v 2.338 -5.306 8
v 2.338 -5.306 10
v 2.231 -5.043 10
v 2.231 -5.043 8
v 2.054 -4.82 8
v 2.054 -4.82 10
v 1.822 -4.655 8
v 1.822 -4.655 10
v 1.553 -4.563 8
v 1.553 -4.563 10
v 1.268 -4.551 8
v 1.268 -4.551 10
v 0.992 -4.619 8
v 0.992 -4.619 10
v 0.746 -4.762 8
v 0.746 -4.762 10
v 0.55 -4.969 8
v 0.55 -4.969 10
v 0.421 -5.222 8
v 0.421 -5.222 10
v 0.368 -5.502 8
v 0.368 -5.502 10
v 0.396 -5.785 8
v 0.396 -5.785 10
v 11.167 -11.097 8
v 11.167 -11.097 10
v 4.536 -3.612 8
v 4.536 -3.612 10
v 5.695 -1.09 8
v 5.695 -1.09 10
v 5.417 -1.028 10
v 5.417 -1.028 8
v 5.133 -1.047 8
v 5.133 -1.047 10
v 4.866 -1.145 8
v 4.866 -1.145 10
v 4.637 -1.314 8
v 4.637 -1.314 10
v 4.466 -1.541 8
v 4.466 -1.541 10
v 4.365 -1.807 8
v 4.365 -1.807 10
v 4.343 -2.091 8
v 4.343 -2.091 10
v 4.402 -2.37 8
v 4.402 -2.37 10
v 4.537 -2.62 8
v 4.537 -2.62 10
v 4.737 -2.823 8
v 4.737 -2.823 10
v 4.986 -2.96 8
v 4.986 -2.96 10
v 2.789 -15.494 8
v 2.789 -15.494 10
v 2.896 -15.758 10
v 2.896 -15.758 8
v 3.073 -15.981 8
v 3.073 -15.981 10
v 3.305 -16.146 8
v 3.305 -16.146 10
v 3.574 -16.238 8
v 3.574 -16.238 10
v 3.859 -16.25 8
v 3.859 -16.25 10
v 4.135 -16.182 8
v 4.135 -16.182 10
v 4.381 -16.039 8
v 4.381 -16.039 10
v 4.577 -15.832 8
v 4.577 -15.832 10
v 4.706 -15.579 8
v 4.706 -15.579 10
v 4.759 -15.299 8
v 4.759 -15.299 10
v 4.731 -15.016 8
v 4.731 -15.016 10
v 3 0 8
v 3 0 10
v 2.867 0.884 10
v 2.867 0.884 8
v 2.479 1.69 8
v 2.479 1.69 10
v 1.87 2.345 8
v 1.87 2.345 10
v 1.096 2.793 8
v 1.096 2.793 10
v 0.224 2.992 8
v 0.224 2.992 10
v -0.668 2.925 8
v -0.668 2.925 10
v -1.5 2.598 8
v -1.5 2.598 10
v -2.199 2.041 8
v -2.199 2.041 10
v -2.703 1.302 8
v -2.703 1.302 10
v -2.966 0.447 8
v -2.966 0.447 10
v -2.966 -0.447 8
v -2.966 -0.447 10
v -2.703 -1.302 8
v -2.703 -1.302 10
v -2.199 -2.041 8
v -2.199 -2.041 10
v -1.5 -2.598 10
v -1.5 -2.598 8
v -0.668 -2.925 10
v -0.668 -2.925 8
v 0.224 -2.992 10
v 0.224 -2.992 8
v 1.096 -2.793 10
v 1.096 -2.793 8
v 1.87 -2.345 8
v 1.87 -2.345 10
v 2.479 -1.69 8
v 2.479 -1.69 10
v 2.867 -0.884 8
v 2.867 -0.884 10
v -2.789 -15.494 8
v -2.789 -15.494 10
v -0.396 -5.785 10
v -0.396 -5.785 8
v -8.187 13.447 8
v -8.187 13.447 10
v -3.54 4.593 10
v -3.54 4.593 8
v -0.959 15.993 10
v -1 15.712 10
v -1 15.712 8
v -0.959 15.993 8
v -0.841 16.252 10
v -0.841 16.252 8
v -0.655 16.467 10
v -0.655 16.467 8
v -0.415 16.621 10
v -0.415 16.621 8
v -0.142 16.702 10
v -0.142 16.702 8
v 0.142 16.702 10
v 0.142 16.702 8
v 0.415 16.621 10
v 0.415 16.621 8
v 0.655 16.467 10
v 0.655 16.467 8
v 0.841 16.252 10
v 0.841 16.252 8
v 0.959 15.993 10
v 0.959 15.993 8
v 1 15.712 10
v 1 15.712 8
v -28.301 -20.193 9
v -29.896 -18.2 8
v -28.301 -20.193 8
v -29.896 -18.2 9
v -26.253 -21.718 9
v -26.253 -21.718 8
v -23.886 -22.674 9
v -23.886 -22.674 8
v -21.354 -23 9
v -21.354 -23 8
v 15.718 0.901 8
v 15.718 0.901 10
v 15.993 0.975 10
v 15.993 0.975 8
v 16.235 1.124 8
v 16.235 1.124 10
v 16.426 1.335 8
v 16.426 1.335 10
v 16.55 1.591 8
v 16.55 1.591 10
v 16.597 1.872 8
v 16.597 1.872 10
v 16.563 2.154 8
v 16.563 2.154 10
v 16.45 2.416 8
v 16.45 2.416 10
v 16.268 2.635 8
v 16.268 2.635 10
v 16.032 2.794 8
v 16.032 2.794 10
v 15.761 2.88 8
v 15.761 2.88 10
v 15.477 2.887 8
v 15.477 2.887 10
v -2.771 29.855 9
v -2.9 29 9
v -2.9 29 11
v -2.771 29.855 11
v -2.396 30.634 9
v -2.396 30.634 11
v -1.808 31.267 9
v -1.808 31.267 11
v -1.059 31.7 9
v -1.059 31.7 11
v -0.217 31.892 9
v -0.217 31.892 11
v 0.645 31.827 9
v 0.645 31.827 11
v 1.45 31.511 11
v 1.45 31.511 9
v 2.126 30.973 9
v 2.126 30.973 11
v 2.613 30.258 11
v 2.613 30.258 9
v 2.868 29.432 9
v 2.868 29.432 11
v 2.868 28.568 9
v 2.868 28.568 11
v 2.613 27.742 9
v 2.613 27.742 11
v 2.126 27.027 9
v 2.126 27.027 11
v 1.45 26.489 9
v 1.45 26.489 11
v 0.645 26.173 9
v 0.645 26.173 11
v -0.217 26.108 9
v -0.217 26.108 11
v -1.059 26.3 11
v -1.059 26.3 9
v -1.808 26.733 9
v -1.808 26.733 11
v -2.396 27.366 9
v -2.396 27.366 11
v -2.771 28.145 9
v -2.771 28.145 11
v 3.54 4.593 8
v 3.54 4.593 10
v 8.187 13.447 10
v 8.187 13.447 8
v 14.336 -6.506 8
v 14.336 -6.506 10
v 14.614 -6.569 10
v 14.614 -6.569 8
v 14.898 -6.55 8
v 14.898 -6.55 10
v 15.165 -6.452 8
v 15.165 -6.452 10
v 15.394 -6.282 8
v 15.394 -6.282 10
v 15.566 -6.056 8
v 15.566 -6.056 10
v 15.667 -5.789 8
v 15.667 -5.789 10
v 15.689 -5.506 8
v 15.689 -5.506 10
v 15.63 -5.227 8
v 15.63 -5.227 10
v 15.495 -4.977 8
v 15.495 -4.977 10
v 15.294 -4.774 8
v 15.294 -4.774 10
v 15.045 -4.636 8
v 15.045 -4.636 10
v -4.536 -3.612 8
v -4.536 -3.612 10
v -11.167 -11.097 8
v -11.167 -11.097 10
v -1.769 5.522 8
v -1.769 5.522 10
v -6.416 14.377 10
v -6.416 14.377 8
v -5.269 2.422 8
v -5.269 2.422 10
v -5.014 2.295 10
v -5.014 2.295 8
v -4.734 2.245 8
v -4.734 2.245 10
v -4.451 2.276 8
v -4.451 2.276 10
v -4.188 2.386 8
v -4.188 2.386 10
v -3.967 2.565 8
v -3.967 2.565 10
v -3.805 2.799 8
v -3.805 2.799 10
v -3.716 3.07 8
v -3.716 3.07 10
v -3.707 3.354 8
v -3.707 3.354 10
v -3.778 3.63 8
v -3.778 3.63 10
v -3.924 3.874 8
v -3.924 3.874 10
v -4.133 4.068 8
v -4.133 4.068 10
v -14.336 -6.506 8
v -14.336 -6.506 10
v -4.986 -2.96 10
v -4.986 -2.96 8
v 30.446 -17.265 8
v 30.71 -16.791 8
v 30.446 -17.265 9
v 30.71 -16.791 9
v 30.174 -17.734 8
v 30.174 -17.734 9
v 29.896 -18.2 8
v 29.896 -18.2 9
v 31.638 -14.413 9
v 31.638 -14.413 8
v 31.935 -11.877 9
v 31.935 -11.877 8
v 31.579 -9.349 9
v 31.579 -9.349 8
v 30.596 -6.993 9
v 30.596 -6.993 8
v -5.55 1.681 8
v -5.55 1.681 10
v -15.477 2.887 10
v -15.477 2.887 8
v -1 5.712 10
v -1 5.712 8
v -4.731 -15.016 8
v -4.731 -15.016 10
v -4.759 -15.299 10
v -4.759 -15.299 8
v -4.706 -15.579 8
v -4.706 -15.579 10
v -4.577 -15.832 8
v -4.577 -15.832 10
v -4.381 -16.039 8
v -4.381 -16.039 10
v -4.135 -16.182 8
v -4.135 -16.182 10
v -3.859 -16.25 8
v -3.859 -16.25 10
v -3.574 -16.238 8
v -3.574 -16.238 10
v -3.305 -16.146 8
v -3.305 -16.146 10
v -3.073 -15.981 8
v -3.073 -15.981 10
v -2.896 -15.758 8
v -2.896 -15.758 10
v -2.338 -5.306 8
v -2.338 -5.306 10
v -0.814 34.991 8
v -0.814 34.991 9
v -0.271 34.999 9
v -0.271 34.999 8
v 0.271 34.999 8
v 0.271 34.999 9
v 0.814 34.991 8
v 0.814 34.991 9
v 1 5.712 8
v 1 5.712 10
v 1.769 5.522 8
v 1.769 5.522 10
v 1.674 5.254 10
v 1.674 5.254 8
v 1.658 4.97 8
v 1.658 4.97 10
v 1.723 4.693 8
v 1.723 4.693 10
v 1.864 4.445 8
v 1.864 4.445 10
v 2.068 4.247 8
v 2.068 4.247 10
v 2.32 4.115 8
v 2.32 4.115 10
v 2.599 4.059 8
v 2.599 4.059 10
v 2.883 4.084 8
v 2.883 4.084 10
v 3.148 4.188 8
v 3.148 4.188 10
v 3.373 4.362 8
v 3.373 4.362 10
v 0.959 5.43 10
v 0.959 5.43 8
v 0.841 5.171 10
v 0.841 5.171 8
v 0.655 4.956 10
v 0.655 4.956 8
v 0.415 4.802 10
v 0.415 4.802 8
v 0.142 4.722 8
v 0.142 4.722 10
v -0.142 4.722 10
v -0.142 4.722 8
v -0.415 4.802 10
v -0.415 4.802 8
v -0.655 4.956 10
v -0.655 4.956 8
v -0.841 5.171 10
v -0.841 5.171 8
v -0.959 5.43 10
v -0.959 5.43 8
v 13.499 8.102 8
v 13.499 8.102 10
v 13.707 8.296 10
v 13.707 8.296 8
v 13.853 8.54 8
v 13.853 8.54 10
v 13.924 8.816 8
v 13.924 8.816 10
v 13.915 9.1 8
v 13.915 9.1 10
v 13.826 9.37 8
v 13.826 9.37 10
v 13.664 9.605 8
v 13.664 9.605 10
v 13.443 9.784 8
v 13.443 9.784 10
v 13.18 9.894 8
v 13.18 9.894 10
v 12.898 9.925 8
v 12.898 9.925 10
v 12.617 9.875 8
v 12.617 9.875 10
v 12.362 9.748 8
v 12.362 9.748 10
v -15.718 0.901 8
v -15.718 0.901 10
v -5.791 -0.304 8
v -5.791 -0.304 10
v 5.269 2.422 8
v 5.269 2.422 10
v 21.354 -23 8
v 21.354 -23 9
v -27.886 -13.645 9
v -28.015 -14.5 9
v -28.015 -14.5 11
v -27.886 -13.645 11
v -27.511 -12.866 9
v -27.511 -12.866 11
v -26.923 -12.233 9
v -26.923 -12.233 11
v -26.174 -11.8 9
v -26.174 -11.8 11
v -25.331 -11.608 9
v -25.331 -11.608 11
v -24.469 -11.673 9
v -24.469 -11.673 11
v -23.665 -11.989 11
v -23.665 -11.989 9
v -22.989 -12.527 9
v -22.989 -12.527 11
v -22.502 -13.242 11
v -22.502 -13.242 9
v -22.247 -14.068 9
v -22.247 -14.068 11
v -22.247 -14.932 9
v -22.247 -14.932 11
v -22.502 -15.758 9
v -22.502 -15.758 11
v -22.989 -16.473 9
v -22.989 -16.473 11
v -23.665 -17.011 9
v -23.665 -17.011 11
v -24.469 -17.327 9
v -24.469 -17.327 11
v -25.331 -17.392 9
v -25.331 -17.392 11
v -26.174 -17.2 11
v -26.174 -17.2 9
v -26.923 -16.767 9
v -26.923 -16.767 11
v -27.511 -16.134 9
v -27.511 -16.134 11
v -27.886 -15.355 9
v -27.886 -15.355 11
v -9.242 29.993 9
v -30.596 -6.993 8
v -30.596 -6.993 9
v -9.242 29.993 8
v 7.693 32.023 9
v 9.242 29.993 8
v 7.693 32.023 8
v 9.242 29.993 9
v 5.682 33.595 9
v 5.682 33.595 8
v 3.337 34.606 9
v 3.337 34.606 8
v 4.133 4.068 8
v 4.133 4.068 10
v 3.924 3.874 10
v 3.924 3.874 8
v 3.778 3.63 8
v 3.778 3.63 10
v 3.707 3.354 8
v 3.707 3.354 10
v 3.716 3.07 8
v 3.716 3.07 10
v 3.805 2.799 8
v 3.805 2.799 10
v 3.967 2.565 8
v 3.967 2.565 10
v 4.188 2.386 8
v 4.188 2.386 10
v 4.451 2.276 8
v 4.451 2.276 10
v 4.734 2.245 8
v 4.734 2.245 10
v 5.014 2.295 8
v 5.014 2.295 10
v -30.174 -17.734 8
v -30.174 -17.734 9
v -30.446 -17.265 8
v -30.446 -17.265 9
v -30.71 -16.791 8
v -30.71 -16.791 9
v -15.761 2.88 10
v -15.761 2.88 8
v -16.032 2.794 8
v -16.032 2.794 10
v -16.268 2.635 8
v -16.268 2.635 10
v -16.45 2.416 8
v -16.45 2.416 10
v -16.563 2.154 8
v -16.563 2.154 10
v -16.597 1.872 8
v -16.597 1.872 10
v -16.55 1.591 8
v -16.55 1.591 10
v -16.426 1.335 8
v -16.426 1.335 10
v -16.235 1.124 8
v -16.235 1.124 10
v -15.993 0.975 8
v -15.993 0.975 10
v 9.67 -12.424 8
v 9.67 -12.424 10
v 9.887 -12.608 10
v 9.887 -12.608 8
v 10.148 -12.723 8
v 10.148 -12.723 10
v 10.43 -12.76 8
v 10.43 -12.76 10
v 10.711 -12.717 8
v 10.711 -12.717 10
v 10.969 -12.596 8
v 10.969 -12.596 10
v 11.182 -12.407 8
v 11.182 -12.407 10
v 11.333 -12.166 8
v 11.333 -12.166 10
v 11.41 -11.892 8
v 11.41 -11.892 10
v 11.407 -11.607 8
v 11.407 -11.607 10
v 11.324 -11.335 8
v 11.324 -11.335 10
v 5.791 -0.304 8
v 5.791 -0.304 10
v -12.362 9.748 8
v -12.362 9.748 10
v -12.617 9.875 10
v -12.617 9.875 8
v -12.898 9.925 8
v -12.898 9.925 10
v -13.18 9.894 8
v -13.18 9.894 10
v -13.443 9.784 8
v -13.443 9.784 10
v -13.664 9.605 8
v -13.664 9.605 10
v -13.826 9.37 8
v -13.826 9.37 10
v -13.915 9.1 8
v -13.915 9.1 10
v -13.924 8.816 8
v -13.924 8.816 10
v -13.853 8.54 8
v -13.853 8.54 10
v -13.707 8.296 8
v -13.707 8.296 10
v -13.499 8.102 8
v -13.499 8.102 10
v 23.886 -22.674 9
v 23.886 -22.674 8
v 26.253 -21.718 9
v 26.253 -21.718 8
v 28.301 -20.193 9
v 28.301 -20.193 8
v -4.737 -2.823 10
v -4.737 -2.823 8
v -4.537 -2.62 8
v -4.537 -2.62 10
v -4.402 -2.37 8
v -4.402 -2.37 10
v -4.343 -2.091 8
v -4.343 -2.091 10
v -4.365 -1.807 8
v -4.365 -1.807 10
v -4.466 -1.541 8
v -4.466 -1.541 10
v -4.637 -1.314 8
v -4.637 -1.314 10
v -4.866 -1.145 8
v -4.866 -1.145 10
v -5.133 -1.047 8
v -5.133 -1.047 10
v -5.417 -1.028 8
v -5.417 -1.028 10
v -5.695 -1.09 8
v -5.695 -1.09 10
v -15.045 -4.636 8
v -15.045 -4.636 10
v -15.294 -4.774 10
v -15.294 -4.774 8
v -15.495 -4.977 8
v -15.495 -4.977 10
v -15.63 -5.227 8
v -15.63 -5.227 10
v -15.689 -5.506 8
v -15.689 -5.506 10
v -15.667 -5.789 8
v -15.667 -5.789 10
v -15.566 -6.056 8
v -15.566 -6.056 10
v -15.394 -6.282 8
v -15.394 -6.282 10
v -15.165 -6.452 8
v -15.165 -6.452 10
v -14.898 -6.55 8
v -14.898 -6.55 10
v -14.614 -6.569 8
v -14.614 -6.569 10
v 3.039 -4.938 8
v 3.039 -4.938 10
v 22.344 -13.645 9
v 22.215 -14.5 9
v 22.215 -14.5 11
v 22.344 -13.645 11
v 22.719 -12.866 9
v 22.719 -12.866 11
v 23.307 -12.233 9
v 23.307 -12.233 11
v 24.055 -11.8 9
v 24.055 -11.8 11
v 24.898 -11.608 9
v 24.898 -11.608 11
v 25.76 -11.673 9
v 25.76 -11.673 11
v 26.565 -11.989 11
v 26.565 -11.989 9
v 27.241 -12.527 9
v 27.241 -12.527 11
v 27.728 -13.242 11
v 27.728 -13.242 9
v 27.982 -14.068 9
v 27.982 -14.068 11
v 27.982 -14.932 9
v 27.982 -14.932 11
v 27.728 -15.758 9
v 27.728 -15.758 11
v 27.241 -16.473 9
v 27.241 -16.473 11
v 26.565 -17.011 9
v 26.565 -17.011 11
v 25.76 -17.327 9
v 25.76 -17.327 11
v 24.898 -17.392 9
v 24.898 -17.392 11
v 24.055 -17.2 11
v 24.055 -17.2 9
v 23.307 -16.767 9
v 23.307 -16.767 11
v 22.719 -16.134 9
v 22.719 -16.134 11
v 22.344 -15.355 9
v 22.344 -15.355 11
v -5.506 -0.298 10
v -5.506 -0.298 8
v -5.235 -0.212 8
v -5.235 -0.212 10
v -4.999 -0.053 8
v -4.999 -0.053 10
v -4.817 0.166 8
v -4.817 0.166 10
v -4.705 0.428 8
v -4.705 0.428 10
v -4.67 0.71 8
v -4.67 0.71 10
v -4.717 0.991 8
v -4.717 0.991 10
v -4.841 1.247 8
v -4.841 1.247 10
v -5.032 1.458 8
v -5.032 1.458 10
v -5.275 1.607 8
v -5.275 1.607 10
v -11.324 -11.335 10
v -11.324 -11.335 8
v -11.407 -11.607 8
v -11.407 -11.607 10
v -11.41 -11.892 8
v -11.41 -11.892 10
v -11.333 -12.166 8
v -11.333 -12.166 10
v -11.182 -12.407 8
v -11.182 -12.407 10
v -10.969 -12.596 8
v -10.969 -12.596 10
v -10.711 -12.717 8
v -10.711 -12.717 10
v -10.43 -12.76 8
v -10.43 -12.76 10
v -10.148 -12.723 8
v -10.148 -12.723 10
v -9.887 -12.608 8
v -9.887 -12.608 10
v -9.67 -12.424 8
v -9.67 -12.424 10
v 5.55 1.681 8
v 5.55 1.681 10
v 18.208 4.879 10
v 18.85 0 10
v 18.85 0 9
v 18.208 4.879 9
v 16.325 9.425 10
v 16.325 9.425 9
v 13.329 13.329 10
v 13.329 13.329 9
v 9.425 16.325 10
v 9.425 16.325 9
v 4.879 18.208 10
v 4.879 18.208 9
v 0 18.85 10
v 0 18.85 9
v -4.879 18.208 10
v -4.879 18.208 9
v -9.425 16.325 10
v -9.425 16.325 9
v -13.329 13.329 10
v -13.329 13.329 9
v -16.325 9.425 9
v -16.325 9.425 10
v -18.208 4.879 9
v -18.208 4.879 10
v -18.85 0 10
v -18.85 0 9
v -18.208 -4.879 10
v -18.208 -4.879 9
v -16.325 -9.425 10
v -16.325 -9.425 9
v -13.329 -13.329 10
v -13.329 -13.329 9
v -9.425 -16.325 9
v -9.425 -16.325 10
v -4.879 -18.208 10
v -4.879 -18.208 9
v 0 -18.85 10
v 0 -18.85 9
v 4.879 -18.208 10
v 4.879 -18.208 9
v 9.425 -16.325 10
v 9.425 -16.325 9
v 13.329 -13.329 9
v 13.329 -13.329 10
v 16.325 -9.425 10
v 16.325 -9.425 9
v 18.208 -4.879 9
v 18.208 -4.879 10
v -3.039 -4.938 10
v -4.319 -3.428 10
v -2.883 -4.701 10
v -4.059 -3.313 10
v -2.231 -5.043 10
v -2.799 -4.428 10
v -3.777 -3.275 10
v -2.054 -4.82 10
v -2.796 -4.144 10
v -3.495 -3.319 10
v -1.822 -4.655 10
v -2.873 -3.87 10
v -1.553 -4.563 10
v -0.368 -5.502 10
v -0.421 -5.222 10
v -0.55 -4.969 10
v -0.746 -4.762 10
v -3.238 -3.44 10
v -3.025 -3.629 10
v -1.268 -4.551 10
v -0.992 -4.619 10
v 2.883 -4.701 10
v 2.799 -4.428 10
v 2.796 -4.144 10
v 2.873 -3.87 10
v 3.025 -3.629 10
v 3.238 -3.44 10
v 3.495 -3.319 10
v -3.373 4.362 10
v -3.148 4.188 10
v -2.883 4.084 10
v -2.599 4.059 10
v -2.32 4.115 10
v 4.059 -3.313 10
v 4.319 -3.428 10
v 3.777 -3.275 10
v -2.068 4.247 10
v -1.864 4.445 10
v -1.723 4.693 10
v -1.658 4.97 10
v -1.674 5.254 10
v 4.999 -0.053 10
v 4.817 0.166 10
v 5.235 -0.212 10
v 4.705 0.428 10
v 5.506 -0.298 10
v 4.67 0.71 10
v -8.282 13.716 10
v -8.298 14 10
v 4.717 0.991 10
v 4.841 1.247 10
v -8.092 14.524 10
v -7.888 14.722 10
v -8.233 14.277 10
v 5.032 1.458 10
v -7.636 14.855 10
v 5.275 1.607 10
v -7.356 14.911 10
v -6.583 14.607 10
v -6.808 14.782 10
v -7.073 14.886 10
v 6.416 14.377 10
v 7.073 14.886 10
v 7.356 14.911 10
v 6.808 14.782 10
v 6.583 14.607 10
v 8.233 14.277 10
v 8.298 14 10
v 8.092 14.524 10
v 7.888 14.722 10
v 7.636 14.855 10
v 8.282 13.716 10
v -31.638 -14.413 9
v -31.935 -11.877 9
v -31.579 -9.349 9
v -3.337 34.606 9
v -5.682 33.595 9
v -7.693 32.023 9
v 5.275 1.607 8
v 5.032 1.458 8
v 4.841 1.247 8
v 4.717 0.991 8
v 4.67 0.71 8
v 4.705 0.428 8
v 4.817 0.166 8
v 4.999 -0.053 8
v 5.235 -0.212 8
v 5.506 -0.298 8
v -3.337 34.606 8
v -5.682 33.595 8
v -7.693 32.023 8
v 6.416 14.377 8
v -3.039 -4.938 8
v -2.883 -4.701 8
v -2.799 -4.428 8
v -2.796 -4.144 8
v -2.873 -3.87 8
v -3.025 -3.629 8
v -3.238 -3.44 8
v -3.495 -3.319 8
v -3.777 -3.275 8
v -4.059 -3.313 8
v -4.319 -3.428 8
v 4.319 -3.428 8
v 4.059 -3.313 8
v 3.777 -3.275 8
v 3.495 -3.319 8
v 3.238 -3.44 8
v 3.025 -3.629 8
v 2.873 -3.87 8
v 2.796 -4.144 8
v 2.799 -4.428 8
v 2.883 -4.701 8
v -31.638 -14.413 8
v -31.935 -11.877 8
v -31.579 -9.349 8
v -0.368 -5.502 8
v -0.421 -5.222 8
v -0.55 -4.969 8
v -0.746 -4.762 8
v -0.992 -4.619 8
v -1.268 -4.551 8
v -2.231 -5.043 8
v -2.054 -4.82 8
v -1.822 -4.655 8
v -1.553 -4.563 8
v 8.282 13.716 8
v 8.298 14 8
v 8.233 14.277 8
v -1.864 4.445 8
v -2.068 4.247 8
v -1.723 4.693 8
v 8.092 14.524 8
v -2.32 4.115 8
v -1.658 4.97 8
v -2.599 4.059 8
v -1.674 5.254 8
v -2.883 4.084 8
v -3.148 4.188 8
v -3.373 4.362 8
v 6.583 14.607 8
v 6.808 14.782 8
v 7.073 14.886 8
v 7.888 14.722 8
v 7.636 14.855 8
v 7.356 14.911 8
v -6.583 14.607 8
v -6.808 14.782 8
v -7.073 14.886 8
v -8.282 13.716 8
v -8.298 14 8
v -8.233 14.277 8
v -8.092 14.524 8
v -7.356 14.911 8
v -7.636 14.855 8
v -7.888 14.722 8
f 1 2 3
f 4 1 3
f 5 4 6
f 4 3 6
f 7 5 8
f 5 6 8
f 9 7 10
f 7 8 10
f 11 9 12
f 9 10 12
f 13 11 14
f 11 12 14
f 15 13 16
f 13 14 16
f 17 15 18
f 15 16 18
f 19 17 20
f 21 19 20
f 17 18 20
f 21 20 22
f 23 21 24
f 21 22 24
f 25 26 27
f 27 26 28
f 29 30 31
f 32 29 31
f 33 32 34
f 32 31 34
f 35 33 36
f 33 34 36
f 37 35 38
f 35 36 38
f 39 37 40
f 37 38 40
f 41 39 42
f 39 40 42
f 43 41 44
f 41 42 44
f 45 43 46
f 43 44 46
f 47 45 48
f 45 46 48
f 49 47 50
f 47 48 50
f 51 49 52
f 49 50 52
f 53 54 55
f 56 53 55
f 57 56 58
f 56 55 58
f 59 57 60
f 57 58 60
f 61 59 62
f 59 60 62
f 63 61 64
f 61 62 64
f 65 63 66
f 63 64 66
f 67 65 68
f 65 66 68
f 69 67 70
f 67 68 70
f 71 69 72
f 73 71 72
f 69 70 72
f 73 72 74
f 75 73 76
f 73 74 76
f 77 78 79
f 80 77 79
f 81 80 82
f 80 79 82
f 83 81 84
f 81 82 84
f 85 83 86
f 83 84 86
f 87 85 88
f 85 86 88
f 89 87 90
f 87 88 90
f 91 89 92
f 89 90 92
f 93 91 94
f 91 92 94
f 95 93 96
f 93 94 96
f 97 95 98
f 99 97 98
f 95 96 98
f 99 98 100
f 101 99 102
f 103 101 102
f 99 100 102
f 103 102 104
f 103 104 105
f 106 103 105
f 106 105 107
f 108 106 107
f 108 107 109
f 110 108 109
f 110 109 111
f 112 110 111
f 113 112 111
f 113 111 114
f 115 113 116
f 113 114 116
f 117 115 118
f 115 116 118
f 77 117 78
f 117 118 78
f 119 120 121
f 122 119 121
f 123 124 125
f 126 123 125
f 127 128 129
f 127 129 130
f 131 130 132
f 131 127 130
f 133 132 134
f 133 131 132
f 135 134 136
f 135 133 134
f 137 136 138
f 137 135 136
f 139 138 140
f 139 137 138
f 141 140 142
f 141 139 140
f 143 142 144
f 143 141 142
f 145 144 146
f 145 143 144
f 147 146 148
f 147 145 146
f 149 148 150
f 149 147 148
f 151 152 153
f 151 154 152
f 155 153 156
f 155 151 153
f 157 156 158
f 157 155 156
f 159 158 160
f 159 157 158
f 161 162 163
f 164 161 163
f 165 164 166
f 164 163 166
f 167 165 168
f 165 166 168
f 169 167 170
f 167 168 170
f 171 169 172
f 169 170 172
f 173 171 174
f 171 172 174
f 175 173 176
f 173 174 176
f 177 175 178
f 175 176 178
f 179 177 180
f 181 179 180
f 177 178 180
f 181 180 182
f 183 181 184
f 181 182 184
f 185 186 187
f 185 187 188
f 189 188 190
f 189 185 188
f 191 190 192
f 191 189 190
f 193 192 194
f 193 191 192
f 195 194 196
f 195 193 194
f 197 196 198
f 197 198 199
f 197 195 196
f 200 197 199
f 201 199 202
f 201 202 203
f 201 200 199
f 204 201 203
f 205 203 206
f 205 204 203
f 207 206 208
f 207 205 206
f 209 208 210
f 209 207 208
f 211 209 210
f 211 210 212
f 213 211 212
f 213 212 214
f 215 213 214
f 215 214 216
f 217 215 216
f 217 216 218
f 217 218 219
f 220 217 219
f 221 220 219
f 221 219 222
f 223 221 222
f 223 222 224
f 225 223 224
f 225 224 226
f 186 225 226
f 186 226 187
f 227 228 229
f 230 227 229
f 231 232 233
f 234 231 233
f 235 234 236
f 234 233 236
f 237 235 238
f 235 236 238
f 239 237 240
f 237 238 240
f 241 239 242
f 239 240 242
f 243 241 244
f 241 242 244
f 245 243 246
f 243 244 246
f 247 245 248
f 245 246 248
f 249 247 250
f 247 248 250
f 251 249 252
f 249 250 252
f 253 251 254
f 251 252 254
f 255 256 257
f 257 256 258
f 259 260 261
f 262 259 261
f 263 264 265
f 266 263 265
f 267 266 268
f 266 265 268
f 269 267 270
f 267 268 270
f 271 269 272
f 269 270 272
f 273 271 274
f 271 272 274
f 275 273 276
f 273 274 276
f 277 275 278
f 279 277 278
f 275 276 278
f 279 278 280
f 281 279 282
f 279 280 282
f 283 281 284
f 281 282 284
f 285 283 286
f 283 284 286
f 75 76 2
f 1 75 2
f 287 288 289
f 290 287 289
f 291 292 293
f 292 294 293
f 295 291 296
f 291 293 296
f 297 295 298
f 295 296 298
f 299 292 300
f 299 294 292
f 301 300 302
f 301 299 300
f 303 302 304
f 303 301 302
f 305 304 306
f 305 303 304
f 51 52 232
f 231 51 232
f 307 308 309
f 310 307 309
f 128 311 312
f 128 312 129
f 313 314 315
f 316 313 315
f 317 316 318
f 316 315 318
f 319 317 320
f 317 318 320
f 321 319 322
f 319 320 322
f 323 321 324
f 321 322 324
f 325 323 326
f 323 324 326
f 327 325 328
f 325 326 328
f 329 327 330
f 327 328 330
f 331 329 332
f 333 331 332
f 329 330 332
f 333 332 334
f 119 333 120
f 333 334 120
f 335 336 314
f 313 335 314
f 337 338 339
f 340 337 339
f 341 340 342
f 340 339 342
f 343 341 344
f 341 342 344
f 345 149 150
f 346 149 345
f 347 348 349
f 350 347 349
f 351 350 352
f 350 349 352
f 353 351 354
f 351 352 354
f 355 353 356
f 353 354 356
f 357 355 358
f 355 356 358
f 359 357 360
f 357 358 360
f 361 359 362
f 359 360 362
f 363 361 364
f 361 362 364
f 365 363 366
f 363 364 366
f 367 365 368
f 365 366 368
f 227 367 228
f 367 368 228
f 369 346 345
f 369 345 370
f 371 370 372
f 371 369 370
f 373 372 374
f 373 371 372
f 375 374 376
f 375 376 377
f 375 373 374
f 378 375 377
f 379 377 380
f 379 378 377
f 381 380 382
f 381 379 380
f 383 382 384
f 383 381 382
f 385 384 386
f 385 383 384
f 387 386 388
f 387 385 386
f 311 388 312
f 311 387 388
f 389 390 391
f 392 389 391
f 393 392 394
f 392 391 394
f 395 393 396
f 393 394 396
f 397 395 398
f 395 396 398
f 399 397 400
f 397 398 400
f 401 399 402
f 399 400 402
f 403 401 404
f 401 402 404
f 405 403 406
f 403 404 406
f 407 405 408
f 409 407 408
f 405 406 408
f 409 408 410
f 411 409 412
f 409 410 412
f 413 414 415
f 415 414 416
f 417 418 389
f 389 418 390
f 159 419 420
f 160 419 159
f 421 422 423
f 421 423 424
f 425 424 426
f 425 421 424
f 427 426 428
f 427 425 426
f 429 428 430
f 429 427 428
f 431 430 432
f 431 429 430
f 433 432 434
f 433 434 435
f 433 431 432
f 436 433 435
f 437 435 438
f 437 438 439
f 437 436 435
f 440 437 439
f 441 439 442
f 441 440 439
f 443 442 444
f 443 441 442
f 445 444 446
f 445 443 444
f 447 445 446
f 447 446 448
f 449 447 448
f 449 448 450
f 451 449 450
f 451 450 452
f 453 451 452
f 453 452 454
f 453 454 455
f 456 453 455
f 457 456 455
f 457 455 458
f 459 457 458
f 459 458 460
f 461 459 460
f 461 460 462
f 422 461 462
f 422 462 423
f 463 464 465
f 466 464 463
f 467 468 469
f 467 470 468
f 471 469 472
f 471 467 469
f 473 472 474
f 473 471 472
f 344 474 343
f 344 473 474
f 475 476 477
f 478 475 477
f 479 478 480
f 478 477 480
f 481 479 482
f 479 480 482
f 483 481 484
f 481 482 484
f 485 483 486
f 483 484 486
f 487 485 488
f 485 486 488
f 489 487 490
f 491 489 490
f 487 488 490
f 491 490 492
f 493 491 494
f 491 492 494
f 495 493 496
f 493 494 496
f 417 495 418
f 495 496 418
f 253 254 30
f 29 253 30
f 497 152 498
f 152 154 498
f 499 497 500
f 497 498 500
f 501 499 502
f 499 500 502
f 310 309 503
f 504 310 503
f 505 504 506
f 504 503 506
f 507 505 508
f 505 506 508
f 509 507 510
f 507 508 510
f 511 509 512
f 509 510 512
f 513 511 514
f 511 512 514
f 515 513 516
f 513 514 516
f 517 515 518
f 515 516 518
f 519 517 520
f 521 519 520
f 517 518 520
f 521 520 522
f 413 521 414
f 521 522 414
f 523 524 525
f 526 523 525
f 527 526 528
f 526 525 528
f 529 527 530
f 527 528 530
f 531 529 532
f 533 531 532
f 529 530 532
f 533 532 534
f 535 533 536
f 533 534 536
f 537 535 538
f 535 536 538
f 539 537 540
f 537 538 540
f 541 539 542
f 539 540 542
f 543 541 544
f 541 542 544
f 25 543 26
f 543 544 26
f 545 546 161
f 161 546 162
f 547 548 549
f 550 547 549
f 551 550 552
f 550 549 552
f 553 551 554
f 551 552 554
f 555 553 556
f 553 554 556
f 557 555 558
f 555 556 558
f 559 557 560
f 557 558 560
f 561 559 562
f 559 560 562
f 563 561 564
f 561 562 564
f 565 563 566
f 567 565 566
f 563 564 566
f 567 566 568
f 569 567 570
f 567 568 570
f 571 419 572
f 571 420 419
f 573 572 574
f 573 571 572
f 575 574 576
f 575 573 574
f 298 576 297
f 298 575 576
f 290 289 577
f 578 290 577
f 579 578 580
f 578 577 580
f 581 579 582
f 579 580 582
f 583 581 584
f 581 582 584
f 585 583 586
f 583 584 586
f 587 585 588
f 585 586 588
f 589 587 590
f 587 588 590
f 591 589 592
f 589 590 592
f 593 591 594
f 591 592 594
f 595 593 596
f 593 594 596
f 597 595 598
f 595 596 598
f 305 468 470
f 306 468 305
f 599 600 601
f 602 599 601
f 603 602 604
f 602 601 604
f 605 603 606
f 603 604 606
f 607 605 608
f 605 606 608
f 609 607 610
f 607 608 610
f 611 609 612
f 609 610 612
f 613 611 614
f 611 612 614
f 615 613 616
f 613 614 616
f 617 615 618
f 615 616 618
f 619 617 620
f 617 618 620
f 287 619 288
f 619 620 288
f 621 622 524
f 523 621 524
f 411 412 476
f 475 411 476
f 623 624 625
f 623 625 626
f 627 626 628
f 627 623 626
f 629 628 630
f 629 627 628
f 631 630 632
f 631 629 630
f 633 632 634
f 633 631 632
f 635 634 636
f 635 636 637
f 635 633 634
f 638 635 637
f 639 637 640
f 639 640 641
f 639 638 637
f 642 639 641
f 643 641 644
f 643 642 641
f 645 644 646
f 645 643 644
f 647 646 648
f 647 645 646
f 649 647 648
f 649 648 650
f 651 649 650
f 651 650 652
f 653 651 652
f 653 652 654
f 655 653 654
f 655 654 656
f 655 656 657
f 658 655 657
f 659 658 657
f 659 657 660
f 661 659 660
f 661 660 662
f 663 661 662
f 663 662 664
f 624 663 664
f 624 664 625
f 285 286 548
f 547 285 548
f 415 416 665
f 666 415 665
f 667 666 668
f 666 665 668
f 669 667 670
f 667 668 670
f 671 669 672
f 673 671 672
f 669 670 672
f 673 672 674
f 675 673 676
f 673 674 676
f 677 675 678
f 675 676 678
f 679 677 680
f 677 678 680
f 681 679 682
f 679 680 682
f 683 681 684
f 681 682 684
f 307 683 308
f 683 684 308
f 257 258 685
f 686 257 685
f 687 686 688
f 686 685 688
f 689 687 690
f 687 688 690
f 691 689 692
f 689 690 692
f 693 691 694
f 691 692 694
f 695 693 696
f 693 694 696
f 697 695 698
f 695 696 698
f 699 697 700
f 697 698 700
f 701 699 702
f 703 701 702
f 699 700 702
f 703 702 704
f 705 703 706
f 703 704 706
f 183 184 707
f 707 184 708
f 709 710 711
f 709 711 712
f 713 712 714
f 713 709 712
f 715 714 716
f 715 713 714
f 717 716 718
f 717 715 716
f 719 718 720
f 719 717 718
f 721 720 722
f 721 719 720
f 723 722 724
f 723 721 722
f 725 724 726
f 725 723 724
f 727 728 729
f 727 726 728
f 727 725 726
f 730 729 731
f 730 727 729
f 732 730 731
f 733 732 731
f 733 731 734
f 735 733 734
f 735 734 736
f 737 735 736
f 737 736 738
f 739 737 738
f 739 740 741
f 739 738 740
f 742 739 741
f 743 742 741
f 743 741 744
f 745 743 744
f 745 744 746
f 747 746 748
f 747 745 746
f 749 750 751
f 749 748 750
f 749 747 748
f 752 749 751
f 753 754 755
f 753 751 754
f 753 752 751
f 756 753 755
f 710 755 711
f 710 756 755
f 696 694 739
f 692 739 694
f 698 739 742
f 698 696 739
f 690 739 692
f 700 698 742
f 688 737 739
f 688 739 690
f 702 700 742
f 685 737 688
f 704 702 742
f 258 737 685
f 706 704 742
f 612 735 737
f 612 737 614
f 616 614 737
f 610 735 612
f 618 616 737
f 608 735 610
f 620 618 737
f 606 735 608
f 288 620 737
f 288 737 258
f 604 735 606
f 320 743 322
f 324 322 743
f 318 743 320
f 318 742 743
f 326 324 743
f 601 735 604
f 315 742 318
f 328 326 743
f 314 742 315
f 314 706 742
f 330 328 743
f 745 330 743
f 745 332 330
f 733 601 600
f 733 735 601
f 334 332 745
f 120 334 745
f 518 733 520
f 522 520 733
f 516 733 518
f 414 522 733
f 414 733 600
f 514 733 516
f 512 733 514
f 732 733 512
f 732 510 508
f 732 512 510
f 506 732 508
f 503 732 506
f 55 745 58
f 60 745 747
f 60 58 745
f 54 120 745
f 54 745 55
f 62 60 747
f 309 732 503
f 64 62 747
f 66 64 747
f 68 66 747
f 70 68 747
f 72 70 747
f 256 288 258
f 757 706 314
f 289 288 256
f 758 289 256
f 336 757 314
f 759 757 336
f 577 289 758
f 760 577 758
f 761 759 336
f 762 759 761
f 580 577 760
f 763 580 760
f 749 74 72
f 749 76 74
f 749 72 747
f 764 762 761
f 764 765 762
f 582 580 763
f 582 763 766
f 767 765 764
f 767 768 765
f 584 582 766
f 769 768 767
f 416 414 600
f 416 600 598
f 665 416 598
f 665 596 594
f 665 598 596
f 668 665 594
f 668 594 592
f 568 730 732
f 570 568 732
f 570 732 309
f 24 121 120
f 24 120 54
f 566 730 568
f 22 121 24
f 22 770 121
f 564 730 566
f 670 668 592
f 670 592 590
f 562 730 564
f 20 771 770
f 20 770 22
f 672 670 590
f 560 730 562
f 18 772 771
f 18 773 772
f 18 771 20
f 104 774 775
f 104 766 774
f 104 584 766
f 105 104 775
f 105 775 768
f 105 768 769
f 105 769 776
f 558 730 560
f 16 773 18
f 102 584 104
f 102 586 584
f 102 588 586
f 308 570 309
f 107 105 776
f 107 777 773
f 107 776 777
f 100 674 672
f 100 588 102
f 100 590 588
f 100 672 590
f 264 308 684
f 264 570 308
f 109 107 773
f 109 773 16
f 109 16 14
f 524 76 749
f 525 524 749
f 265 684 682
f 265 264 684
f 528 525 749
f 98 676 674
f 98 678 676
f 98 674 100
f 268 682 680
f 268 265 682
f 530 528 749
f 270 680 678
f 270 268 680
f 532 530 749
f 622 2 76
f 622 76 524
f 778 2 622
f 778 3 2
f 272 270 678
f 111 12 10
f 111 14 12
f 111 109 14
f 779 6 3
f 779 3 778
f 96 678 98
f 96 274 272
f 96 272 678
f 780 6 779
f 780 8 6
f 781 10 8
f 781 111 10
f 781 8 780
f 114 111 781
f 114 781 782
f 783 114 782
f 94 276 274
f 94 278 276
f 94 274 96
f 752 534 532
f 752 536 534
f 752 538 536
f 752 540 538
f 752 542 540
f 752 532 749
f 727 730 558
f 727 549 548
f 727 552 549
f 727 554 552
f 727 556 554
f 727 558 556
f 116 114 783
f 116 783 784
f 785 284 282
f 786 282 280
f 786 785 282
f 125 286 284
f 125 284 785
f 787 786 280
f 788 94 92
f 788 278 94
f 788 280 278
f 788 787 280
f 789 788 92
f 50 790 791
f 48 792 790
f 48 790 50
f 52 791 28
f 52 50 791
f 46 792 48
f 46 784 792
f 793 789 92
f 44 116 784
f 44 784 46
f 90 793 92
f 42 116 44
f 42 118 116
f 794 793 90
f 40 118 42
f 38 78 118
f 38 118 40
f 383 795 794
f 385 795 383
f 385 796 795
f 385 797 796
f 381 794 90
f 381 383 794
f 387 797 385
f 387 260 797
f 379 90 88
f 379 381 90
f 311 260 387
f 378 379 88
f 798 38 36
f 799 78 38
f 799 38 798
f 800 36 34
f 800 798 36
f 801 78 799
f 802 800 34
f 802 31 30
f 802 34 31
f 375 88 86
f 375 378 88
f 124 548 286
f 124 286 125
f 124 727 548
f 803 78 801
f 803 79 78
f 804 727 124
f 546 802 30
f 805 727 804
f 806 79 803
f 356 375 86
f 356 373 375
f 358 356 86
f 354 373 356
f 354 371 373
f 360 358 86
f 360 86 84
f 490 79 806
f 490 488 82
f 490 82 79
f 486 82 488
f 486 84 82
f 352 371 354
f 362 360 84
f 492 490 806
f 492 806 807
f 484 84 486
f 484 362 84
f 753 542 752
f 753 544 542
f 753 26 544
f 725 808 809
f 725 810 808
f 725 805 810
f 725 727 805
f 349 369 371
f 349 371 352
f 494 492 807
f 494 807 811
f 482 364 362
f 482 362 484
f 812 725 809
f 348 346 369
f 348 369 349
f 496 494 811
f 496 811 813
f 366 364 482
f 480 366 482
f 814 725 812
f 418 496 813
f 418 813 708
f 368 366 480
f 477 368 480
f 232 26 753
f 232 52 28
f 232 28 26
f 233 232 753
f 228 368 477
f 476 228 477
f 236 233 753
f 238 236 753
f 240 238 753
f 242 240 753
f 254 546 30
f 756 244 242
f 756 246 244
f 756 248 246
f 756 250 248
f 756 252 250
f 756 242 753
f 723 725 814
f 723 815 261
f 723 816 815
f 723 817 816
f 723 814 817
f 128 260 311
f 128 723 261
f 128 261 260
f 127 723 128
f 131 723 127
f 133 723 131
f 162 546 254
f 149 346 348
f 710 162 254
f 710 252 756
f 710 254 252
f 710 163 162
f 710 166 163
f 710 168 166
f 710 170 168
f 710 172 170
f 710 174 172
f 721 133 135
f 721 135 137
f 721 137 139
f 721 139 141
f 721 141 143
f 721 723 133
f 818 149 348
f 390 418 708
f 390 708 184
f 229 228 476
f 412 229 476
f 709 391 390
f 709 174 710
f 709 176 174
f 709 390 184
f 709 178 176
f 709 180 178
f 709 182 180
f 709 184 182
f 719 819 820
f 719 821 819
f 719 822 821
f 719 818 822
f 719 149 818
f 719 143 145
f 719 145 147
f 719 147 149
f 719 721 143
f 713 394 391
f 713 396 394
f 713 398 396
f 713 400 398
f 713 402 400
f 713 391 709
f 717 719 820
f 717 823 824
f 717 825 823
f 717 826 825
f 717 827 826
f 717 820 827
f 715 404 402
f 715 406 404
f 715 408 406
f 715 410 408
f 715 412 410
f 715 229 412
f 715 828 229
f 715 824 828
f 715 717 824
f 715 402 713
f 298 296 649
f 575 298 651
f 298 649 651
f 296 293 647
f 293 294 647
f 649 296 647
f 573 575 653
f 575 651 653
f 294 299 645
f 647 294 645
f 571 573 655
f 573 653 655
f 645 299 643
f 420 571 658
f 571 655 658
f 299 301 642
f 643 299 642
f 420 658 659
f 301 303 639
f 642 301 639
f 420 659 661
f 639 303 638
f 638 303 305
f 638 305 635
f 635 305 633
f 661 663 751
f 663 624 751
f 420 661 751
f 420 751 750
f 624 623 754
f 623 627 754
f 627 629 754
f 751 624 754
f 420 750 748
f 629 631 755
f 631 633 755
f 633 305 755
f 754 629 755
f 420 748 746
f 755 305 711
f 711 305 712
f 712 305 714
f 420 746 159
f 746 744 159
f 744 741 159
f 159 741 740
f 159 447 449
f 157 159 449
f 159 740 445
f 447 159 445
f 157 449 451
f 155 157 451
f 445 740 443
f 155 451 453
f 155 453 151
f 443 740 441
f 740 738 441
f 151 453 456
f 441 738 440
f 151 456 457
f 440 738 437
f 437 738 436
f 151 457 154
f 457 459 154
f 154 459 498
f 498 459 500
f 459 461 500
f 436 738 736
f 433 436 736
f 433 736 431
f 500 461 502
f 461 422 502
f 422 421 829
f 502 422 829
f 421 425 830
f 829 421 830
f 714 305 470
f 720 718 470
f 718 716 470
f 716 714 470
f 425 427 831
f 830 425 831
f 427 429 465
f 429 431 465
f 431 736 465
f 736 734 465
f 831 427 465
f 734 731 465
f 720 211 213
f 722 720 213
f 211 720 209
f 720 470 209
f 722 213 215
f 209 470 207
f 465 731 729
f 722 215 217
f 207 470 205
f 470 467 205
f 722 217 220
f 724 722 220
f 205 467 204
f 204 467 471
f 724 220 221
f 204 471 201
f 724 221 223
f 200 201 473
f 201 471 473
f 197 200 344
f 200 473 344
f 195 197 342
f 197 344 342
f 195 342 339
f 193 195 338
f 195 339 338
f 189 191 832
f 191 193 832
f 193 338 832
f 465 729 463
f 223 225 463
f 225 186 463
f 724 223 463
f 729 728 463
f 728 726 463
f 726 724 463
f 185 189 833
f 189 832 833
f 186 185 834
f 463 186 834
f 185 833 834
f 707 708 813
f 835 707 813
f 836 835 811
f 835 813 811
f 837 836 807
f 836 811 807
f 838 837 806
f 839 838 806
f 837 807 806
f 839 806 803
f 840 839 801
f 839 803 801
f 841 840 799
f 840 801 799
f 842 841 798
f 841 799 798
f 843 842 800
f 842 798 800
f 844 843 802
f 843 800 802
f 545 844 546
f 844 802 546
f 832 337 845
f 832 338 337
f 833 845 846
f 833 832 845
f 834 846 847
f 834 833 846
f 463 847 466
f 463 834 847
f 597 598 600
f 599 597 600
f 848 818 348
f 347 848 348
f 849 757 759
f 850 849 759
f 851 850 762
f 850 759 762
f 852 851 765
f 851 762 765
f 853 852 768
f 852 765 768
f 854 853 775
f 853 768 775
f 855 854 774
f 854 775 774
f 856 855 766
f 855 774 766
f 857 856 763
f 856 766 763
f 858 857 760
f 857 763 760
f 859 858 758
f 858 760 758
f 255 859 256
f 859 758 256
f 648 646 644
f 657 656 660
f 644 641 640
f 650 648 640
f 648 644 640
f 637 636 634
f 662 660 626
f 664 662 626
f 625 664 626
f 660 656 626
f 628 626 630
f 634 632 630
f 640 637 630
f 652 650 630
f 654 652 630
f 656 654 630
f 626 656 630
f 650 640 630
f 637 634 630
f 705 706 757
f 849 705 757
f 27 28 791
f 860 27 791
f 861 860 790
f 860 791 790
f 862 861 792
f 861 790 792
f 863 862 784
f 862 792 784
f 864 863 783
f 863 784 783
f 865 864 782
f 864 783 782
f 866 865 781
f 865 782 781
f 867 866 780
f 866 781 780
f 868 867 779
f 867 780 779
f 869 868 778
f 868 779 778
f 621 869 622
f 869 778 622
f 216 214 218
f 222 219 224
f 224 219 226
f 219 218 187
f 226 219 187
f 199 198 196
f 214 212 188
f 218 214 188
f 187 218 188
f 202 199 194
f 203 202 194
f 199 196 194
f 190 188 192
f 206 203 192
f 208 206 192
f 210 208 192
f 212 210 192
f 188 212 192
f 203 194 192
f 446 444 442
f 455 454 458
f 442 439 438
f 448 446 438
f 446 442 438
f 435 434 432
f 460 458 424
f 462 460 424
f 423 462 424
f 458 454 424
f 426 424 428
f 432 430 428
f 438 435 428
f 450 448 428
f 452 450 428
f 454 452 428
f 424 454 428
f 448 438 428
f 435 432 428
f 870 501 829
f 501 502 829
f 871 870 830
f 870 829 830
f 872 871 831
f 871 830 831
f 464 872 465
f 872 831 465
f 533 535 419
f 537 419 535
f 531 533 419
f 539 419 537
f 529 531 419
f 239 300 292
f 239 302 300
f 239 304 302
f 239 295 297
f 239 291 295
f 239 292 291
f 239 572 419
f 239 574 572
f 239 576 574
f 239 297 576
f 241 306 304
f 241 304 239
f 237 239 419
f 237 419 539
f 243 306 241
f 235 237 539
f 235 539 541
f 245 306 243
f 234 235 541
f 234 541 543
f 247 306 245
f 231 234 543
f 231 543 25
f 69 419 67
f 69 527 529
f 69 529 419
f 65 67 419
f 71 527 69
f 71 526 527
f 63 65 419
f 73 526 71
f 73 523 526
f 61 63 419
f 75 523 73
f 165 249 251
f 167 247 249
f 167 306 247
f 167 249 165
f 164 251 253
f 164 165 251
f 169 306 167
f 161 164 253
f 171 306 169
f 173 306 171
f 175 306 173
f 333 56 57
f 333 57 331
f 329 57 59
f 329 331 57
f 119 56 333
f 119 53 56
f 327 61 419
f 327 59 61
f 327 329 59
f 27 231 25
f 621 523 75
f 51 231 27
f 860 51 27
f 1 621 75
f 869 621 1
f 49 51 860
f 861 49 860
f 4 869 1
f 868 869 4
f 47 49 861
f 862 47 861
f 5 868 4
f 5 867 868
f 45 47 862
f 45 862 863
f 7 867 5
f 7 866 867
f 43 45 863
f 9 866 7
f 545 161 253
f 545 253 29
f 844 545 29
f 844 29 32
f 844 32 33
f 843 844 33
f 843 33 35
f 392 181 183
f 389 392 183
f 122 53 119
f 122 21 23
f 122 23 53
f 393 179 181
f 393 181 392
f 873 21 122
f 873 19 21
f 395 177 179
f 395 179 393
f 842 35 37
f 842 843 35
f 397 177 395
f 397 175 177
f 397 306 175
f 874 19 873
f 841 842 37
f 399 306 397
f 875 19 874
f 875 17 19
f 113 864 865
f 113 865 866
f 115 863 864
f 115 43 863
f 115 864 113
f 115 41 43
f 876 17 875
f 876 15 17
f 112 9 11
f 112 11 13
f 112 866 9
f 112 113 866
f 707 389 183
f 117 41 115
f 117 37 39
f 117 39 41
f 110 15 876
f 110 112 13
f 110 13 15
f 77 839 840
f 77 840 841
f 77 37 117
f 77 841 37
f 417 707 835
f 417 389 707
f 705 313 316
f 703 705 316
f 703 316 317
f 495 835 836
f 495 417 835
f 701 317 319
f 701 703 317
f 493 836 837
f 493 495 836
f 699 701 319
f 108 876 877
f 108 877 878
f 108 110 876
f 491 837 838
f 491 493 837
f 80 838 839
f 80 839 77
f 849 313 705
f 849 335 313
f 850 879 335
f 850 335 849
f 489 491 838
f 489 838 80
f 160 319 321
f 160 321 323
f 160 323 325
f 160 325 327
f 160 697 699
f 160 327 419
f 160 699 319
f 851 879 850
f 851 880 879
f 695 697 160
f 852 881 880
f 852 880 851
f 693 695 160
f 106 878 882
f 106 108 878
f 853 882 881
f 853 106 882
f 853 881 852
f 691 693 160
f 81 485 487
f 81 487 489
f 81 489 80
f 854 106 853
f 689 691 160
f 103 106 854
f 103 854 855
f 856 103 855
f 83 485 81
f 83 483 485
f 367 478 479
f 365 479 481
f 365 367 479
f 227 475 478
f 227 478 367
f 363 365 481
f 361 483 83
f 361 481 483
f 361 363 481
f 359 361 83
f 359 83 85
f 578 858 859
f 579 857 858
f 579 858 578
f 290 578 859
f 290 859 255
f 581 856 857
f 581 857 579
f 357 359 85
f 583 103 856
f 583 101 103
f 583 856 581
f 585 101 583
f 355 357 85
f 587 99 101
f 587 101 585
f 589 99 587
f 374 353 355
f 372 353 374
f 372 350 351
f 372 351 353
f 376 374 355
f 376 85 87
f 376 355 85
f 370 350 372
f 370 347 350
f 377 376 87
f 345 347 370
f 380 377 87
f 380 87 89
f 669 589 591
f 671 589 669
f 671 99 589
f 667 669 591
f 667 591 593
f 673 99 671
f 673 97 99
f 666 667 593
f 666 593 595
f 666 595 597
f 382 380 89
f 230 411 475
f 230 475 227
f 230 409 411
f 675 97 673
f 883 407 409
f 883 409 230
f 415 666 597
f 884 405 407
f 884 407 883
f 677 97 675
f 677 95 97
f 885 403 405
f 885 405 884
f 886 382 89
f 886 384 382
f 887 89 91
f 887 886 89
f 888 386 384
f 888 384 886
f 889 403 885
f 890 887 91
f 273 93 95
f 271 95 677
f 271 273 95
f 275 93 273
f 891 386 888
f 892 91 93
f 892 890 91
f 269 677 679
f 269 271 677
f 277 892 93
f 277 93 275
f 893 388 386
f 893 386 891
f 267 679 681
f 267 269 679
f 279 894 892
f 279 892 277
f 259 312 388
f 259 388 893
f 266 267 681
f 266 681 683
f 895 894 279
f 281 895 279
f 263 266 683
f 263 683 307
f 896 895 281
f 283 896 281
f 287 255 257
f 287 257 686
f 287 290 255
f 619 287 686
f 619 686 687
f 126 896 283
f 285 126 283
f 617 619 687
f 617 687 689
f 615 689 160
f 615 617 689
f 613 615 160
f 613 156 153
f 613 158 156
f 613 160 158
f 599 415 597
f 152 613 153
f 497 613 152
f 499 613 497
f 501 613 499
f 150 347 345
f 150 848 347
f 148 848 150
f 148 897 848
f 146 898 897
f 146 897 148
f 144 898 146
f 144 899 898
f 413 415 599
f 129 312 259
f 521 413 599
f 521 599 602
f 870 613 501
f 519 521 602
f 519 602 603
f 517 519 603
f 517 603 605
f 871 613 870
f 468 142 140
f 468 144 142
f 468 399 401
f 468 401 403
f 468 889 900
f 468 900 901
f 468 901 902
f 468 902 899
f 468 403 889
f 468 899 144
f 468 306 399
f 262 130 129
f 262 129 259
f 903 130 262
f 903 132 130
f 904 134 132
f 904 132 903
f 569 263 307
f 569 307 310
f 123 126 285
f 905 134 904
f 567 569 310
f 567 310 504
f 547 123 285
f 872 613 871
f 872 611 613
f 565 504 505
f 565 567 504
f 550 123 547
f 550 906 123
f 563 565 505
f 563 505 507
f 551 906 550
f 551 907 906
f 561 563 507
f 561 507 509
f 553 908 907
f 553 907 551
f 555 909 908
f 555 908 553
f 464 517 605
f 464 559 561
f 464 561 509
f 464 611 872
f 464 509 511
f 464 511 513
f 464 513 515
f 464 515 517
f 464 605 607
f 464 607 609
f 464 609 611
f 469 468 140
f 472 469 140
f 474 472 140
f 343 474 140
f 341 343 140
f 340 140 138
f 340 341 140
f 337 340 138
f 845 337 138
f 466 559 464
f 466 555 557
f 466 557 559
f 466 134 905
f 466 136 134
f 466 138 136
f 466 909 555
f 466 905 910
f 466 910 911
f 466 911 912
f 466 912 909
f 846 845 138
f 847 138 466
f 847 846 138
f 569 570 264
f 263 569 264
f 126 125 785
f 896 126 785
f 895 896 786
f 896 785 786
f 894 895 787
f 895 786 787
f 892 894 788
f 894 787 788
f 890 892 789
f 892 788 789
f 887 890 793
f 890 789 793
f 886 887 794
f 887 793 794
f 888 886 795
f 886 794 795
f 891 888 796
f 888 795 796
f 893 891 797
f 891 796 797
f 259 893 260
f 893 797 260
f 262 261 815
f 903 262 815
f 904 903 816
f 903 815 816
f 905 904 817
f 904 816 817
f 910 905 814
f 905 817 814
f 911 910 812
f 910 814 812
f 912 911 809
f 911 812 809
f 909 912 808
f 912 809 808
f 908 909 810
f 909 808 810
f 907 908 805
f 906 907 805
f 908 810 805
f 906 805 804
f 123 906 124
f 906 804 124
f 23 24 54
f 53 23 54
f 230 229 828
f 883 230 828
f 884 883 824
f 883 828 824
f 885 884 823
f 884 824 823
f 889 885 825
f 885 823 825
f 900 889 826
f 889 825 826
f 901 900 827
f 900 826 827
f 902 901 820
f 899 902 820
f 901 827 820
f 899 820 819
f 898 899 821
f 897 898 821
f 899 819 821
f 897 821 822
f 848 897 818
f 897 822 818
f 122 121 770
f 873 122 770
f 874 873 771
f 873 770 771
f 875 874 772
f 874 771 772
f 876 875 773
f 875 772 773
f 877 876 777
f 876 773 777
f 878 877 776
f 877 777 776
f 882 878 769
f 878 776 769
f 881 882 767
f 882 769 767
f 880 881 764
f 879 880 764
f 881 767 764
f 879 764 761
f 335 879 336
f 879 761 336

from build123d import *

# Parameters (mm, degrees)
SKETCH2_R           = 18.85
SKETCH2_R_2         = 3
BOSS_EXTRUDE1_DEPTH = 2
BOSS_EXTRUDE2_START = -1
SKETCH3_R           = 35
SKETCH3_R_2         = 18.85
BOSS_EXTRUDE2_DEPTH = 1
SKETCH4_R           = 2.9
BOSS_EXTRUDE3_DEPTH = 3
SKETCH6_R           = 5
BOSS_EXTRUDE4_DEPTH = 1
SKETCH7_R           = 59.131365533
CUT_EXTRUDE1_DEPTH  = 10
FILLET1_R           = 10


with BuildPart() as part:
    # Sketch2 → Boss-Extrude1 (new body)
    with BuildSketch(Plane.XY.offset(10)):
        Circle(SKETCH2_R)
        Circle(SKETCH2_R_2, mode=Mode.SUBTRACT)
        with BuildLine():
            Line((1, 15.711728477), (1, 5.711728477))
            ThreePointArc((1, 5.711728477), (0, 4.711728477), (-1, 5.711728477))
            Line((-1, 5.711728477), (-1, 15.711728477))
            ThreePointArc((-1, 15.711728477), (0, 16.711728477), (1, 15.711728477))
        make_face(mode=Mode.SUBTRACT)
        with BuildLine():
            Line((6.416148271, 14.376767826), (1.76891655, 5.522207569))
            ThreePointArc((1.76891655, 5.522207569), (2.189649404, 4.172028372), (3.539828602, 4.592761225))
            Line((3.539828602, 4.592761225), (8.187060322, 13.447321482))
            ThreePointArc((8.187060322, 13.447321482), (7.766327468, 14.797500679), (6.416148271, 14.376767826))
        make_face(mode=Mode.SUBTRACT)
        with BuildLine():
            Line((12.362434295, 9.748262924), (4.132595637, 4.067615457))
            ThreePointArc((4.132595637, 4.067615457), (3.877676517, 2.676566844), (5.26872513, 2.421647725))
            Line((5.26872513, 2.421647725), (13.498563789, 8.102295192))
            ThreePointArc((13.498563789, 8.102295192), (13.753482908, 9.493343805), (12.362434295, 9.748262924))
        make_face(mode=Mode.SUBTRACT)
        with BuildLine():
            Line((15.476635607, 2.886548466), (5.549546866, 1.681181663))
            ThreePointArc((5.549546866, 1.681181663), (4.677374672, 0.567936109), (5.790620226, -0.304236085))
            Line((5.790620226, -0.304236085), (15.717708967, 0.901130718))
            ThreePointArc((15.717708967, 0.901130718), (16.589881161, 2.014376272), (15.476635607, 2.886548466))
        make_face(mode=Mode.SUBTRACT)
        with BuildLine():
            Line((15.045326214, -4.636439459), (5.695163787, -1.090390589))
            ThreePointArc((5.695163787, -1.090390589), (4.405542658, -1.670801945), (4.985954013, -2.960423074))
            Line((4.985954013, -2.960423074), (14.33611644, -6.506471945))
            ThreePointArc((14.33611644, -6.506471945), (15.62573757, -5.926060589), (15.045326214, -4.636439459))
        make_face(mode=Mode.SUBTRACT)
        with BuildLine():
            Line((11.167313902, -11.097274979), (4.536087319, -3.612167498))
            ThreePointArc((4.536087319, -3.612167498), (3.124453913, -3.526779408), (3.039065823, -4.938412814))
            Line((3.039065823, -4.938412814), (9.670292405, -12.423520296))
            ThreePointArc((9.670292405, -12.423520296), (11.081925812, -12.508908386), (11.167313902, -11.097274979))
        make_face(mode=Mode.SUBTRACT)
        with BuildLine():
            Line((4.731004555, -15.015858538), (2.337847912, -5.306440364))
            ThreePointArc((2.337847912, -5.306440364), (1.127590431, -4.574814211), (0.395964277, -5.785071693))
            Line((0.395964277, -5.785071693), (2.78912092, -15.494489867))
            ThreePointArc((2.78912092, -15.494489867), (3.999378402, -16.22611602), (4.731004555, -15.015858538))
        make_face(mode=Mode.SUBTRACT)
        with BuildLine():
            Line((-2.78912092, -15.494489867), (-0.395964277, -5.785071693))
            ThreePointArc((-0.395964277, -5.785071693), (-1.127590431, -4.574814211), (-2.337847912, -5.306440364))
            Line((-2.337847912, -5.306440364), (-4.731004555, -15.015858538))
            ThreePointArc((-4.731004555, -15.015858538), (-3.999378402, -16.22611602), (-2.78912092, -15.494489867))
        make_face(mode=Mode.SUBTRACT)
        with BuildLine():
            Line((-9.670292405, -12.423520296), (-3.039065823, -4.938412814))
            ThreePointArc((-3.039065823, -4.938412814), (-3.124453913, -3.526779408), (-4.536087319, -3.612167498))
            Line((-4.536087319, -3.612167498), (-11.167313902, -11.097274979))
            ThreePointArc((-11.167313902, -11.097274979), (-11.081925812, -12.508908386), (-9.670292405, -12.423520296))
        make_face(mode=Mode.SUBTRACT)
        with BuildLine():
            Line((-14.33611644, -6.506471945), (-4.985954013, -2.960423074))
            ThreePointArc((-4.985954013, -2.960423074), (-4.405542658, -1.670801945), (-5.695163787, -1.090390589))
            Line((-5.695163787, -1.090390589), (-15.045326214, -4.636439459))
            ThreePointArc((-15.045326214, -4.636439459), (-15.62573757, -5.926060589), (-14.33611644, -6.506471945))
        make_face(mode=Mode.SUBTRACT)
        with BuildLine():
            Line((-15.717708967, 0.901130718), (-5.790620226, -0.304236085))
            ThreePointArc((-5.790620226, -0.304236085), (-4.677374672, 0.567936109), (-5.549546866, 1.681181663))
            Line((-5.549546866, 1.681181663), (-15.476635607, 2.886548466))
            ThreePointArc((-15.476635607, 2.886548466), (-16.589881161, 2.014376272), (-15.717708967, 0.901130718))
        make_face(mode=Mode.SUBTRACT)
        with BuildLine():
            Line((-13.498563789, 8.102295192), (-5.26872513, 2.421647725))
            ThreePointArc((-5.26872513, 2.421647725), (-3.877676517, 2.676566844), (-4.132595637, 4.067615457))
            Line((-4.132595637, 4.067615457), (-12.362434295, 9.748262924))
            ThreePointArc((-12.362434295, 9.748262924), (-13.753482908, 9.493343805), (-13.498563789, 8.102295192))
        make_face(mode=Mode.SUBTRACT)
        with BuildLine():
            Line((-8.187060322, 13.447321482), (-3.539828602, 4.592761225))
            ThreePointArc((-3.539828602, 4.592761225), (-2.189649404, 4.172028372), (-1.76891655, 5.522207569))
            Line((-1.76891655, 5.522207569), (-6.416148271, 14.376767826))
            ThreePointArc((-6.416148271, 14.376767826), (-7.766327468, 14.797500679), (-8.187060322, 13.447321482))
        make_face(mode=Mode.SUBTRACT)
    extrude(amount=-BOSS_EXTRUDE1_DEPTH)

    # Sketch3 → Boss-Extrude2 (add)
    with BuildSketch(Plane(origin=(0, 0, 8), x_dir=(-1, 0, 0), z_dir=(0, 0, -1)).offset(BOSS_EXTRUDE2_START)):
        Circle(SKETCH3_R)
        with Locations(Location((0, 0, 0), (0, 0, 180))):
            Circle(SKETCH3_R_2, mode=Mode.SUBTRACT)
    extrude(amount=BOSS_EXTRUDE2_DEPTH)

    # Sketch4 → Boss-Extrude3 (add)
    with BuildSketch(Plane(origin=(0, 0, 8), x_dir=(-1, 0, 0), z_dir=(0, 0, -1))):
        with Locations((0, 29)):
            Circle(SKETCH4_R)
        with Locations((25.11473671, -14.5)):
            Circle(SKETCH4_R)
        with Locations((-25.11473671, -14.5)):
            Circle(SKETCH4_R)
    extrude(amount=-BOSS_EXTRUDE3_DEPTH)

    # Sketch6 → Boss-Extrude4 (add)
    with BuildSketch(Plane(origin=(0, 0, 9), x_dir=(-1, 0, 0), z_dir=(0, 0, -1))):
        with Locations((0, 30)):
            Circle(SKETCH6_R)
        with Locations((25.980762114, -15)):
            Circle(SKETCH6_R)
        with Locations((-25.980762114, -15)):
            Circle(SKETCH6_R)
    extrude(amount=BOSS_EXTRUDE4_DEPTH)

    # Sketch7 → Cut-Extrude1 (cut)
    with BuildSketch(Plane(origin=(0, 0, 8), x_dir=(-1, 0, 0), z_dir=(0, 0, -1))):
        Circle(SKETCH7_R)
        Polygon((0, 46), (-39.837168574, -23), (39.837168574, -23), align=None, mode=Mode.SUBTRACT)
    extrude(amount=-CUT_EXTRUDE1_DEPTH, mode=Mode.SUBTRACT)

    # Fillet1
    fillet1_edges = [part.edges().sort_by_distance(p)[0] for p in [
        (-6.727678329, 34.347319318, 8.5),
        (-33.109490245, -11.347319318, 8.5),
        (-26.381811917, -23, 8.5),
        (26.381811917, -23, 8.5),
        (33.109490245, -11.347319318, 8.5),
        (6.727678329, 34.347319318, 8.5),
    ]]
    fillet(fillet1_edges, radius=FILLET1_R)


solid = part.part
